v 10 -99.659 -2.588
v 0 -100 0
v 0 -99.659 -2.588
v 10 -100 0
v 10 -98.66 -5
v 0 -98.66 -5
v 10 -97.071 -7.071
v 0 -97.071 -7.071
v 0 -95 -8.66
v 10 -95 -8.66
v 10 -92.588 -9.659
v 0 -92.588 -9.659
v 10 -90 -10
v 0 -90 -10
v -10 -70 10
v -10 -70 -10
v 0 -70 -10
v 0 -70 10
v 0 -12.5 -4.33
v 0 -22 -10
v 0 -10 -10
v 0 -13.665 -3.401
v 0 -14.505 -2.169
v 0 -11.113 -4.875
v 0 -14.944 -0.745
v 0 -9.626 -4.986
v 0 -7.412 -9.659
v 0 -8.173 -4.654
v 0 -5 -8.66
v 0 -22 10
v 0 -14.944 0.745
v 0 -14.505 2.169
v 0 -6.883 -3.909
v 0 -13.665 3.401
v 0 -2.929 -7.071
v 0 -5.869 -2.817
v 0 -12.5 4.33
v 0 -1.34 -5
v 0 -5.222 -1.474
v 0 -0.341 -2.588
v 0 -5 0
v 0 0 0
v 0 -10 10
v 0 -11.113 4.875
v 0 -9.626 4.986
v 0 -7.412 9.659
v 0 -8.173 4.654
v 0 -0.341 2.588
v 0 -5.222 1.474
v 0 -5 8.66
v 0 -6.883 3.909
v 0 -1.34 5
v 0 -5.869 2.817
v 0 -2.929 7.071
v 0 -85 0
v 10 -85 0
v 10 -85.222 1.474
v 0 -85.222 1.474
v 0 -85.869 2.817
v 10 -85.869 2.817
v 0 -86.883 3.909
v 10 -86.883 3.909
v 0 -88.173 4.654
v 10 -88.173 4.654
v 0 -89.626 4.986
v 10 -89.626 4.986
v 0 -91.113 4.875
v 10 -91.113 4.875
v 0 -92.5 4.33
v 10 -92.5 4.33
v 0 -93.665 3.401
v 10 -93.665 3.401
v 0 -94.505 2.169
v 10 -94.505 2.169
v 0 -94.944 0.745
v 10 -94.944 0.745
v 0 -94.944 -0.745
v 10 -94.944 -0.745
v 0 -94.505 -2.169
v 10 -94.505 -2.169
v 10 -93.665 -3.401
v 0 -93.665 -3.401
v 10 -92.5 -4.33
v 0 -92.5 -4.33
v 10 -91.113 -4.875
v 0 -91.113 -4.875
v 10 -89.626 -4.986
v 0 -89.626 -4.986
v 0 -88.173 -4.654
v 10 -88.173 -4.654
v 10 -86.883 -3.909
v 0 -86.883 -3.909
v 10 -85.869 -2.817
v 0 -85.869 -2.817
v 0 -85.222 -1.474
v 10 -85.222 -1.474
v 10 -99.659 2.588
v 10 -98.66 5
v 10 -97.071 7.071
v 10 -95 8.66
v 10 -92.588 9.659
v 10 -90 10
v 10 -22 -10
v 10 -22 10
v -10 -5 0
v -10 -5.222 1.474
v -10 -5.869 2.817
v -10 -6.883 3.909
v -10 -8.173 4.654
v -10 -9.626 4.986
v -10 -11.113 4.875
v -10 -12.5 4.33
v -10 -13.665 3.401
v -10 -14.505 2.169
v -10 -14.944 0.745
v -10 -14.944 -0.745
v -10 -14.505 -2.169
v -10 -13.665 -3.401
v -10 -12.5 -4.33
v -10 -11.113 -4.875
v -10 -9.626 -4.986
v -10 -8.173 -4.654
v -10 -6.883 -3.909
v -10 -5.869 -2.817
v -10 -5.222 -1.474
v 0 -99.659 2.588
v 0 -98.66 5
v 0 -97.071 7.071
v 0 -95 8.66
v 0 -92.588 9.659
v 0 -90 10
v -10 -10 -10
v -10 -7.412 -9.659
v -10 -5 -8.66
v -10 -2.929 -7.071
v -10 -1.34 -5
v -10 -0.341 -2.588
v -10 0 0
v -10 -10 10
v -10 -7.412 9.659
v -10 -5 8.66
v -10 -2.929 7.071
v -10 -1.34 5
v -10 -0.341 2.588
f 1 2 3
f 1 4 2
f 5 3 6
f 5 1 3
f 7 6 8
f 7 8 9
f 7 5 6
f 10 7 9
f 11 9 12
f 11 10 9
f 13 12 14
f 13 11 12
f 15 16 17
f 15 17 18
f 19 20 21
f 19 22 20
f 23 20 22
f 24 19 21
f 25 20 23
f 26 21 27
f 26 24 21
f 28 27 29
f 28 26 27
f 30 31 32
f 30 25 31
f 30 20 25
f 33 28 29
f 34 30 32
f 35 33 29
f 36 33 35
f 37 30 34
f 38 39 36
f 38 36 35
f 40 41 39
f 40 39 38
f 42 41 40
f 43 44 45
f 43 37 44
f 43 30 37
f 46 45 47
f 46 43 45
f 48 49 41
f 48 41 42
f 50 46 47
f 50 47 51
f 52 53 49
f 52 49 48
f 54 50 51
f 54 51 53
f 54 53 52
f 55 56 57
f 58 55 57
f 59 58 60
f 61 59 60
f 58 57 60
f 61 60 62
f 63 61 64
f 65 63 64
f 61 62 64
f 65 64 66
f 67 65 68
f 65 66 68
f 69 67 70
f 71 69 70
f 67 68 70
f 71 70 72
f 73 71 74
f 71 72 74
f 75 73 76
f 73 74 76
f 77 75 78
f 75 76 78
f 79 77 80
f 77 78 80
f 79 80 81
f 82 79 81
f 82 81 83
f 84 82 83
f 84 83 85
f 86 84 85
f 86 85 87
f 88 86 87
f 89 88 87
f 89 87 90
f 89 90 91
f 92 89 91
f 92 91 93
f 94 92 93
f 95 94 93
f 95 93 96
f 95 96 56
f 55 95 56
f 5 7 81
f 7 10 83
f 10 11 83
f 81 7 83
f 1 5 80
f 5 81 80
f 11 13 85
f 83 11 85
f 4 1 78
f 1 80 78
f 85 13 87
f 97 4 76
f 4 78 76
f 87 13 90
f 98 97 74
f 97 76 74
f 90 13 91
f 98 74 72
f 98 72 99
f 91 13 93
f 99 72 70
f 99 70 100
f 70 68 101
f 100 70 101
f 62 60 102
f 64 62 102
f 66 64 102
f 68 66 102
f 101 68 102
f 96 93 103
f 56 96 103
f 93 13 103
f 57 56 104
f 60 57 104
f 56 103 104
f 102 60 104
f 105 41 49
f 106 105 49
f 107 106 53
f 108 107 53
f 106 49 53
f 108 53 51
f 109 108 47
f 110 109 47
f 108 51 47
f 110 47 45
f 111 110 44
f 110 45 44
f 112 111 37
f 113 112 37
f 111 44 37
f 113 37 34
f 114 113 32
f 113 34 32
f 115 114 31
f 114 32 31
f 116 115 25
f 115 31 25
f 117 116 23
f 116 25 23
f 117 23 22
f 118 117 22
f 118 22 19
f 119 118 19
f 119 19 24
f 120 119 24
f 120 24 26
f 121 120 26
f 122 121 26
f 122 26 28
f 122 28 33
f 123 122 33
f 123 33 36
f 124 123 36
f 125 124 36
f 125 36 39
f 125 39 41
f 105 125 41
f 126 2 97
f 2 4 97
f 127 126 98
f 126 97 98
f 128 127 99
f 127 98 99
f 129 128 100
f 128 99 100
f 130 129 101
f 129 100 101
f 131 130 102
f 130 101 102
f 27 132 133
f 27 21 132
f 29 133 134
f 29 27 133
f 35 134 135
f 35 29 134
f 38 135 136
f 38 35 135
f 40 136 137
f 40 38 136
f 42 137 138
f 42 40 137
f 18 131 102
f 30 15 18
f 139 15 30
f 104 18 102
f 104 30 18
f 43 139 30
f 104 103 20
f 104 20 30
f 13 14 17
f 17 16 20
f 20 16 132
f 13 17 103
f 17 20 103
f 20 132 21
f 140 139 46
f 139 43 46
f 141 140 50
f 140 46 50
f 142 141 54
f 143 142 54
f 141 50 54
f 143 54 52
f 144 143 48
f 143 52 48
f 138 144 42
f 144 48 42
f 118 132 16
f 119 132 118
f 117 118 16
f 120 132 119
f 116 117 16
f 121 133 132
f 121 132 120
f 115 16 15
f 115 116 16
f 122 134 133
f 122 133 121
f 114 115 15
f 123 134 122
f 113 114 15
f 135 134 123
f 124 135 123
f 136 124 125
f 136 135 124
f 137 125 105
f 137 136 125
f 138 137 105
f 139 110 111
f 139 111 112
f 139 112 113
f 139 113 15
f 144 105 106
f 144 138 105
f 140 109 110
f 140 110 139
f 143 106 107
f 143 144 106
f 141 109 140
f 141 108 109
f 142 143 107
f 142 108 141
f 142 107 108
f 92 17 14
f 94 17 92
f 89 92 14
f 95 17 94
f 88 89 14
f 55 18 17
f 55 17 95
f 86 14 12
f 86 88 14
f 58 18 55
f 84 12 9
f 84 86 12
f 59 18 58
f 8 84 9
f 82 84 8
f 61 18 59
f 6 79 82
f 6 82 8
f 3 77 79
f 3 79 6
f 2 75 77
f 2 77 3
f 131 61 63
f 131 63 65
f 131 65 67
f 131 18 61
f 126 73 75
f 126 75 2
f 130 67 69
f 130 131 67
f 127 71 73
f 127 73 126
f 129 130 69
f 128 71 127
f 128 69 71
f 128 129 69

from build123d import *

# Parameters (mm, degrees)
F0_W     = 20
F0_H     = 20
F1_DEPTH = 100
F2_R     = 5
F3_DEPTH = 20.001
F4_R     = 5
F5_DEPTH = 20.001
F6_W     = 22
F6_H     = 20
F6_R     = 5
F7_DEPTH = 10
F8_W     = 30
F8_H     = 20
F8_R     = 5
F9_DEPTH = 10
F10_R    = 9.99999


# Not quite as in the source:
# - a fillet or chamfer is up to 0.001 mm smaller than in the source, because OpenCascade refuses the exact size


with BuildPart() as f1:
    # F0 (on Front) → F1 (new body)
    with BuildSketch(Plane.XZ):
        Rectangle(F0_W, F0_H)
    extrude(amount=F1_DEPTH)

    # F2 (on face) → F3 (cut, through all)
    with BuildSketch(Plane.YZ.offset(10)):
        with Locations((-90, 0)):
            Circle(F2_R)
    extrude(amount=-F3_DEPTH, mode=Mode.SUBTRACT)

    # F4 (on face) → F5 (cut, through all)
    with BuildSketch(Plane.YZ.offset(10)):
        with Locations((-10, 0)):
            Circle(F4_R)
    extrude(amount=-F5_DEPTH, mode=Mode.SUBTRACT)

    # F6 (on face) → F7 (cut)
    with BuildSketch(Plane.YZ.offset(10)):
        with Locations((-11, 0)):
            Rectangle(F6_W, F6_H)
        with Locations((-10, 0)):
            Circle(F6_R, mode=Mode.SUBTRACT)
    extrude(amount=-F7_DEPTH, mode=Mode.SUBTRACT)

    # F8 (on face) → F9 (cut)
    with BuildSketch(Plane(origin=(-10, 0, 0), x_dir=(0, -1, 0), z_dir=(-1, 0, 0))):
        with Locations((85, 0)):
            Rectangle(F8_W, F8_H)
        with Locations((90, 0)):
            Circle(F8_R, mode=Mode.SUBTRACT)
    extrude(amount=-F9_DEPTH, mode=Mode.SUBTRACT)

    # F10 (radius 10 in the source; OpenCascade refuses exactly that, so slightly less here)
    f10_edges = [f1.edges().sort_by_distance(p)[0] for p in [
        (5, -100, 10),
        (5, -100, -10),
        (-5, 0, -10),
        (-5, 0, 10),
    ]]
    fillet(f10_edges, radius=F10_R)


solid = f1.part
